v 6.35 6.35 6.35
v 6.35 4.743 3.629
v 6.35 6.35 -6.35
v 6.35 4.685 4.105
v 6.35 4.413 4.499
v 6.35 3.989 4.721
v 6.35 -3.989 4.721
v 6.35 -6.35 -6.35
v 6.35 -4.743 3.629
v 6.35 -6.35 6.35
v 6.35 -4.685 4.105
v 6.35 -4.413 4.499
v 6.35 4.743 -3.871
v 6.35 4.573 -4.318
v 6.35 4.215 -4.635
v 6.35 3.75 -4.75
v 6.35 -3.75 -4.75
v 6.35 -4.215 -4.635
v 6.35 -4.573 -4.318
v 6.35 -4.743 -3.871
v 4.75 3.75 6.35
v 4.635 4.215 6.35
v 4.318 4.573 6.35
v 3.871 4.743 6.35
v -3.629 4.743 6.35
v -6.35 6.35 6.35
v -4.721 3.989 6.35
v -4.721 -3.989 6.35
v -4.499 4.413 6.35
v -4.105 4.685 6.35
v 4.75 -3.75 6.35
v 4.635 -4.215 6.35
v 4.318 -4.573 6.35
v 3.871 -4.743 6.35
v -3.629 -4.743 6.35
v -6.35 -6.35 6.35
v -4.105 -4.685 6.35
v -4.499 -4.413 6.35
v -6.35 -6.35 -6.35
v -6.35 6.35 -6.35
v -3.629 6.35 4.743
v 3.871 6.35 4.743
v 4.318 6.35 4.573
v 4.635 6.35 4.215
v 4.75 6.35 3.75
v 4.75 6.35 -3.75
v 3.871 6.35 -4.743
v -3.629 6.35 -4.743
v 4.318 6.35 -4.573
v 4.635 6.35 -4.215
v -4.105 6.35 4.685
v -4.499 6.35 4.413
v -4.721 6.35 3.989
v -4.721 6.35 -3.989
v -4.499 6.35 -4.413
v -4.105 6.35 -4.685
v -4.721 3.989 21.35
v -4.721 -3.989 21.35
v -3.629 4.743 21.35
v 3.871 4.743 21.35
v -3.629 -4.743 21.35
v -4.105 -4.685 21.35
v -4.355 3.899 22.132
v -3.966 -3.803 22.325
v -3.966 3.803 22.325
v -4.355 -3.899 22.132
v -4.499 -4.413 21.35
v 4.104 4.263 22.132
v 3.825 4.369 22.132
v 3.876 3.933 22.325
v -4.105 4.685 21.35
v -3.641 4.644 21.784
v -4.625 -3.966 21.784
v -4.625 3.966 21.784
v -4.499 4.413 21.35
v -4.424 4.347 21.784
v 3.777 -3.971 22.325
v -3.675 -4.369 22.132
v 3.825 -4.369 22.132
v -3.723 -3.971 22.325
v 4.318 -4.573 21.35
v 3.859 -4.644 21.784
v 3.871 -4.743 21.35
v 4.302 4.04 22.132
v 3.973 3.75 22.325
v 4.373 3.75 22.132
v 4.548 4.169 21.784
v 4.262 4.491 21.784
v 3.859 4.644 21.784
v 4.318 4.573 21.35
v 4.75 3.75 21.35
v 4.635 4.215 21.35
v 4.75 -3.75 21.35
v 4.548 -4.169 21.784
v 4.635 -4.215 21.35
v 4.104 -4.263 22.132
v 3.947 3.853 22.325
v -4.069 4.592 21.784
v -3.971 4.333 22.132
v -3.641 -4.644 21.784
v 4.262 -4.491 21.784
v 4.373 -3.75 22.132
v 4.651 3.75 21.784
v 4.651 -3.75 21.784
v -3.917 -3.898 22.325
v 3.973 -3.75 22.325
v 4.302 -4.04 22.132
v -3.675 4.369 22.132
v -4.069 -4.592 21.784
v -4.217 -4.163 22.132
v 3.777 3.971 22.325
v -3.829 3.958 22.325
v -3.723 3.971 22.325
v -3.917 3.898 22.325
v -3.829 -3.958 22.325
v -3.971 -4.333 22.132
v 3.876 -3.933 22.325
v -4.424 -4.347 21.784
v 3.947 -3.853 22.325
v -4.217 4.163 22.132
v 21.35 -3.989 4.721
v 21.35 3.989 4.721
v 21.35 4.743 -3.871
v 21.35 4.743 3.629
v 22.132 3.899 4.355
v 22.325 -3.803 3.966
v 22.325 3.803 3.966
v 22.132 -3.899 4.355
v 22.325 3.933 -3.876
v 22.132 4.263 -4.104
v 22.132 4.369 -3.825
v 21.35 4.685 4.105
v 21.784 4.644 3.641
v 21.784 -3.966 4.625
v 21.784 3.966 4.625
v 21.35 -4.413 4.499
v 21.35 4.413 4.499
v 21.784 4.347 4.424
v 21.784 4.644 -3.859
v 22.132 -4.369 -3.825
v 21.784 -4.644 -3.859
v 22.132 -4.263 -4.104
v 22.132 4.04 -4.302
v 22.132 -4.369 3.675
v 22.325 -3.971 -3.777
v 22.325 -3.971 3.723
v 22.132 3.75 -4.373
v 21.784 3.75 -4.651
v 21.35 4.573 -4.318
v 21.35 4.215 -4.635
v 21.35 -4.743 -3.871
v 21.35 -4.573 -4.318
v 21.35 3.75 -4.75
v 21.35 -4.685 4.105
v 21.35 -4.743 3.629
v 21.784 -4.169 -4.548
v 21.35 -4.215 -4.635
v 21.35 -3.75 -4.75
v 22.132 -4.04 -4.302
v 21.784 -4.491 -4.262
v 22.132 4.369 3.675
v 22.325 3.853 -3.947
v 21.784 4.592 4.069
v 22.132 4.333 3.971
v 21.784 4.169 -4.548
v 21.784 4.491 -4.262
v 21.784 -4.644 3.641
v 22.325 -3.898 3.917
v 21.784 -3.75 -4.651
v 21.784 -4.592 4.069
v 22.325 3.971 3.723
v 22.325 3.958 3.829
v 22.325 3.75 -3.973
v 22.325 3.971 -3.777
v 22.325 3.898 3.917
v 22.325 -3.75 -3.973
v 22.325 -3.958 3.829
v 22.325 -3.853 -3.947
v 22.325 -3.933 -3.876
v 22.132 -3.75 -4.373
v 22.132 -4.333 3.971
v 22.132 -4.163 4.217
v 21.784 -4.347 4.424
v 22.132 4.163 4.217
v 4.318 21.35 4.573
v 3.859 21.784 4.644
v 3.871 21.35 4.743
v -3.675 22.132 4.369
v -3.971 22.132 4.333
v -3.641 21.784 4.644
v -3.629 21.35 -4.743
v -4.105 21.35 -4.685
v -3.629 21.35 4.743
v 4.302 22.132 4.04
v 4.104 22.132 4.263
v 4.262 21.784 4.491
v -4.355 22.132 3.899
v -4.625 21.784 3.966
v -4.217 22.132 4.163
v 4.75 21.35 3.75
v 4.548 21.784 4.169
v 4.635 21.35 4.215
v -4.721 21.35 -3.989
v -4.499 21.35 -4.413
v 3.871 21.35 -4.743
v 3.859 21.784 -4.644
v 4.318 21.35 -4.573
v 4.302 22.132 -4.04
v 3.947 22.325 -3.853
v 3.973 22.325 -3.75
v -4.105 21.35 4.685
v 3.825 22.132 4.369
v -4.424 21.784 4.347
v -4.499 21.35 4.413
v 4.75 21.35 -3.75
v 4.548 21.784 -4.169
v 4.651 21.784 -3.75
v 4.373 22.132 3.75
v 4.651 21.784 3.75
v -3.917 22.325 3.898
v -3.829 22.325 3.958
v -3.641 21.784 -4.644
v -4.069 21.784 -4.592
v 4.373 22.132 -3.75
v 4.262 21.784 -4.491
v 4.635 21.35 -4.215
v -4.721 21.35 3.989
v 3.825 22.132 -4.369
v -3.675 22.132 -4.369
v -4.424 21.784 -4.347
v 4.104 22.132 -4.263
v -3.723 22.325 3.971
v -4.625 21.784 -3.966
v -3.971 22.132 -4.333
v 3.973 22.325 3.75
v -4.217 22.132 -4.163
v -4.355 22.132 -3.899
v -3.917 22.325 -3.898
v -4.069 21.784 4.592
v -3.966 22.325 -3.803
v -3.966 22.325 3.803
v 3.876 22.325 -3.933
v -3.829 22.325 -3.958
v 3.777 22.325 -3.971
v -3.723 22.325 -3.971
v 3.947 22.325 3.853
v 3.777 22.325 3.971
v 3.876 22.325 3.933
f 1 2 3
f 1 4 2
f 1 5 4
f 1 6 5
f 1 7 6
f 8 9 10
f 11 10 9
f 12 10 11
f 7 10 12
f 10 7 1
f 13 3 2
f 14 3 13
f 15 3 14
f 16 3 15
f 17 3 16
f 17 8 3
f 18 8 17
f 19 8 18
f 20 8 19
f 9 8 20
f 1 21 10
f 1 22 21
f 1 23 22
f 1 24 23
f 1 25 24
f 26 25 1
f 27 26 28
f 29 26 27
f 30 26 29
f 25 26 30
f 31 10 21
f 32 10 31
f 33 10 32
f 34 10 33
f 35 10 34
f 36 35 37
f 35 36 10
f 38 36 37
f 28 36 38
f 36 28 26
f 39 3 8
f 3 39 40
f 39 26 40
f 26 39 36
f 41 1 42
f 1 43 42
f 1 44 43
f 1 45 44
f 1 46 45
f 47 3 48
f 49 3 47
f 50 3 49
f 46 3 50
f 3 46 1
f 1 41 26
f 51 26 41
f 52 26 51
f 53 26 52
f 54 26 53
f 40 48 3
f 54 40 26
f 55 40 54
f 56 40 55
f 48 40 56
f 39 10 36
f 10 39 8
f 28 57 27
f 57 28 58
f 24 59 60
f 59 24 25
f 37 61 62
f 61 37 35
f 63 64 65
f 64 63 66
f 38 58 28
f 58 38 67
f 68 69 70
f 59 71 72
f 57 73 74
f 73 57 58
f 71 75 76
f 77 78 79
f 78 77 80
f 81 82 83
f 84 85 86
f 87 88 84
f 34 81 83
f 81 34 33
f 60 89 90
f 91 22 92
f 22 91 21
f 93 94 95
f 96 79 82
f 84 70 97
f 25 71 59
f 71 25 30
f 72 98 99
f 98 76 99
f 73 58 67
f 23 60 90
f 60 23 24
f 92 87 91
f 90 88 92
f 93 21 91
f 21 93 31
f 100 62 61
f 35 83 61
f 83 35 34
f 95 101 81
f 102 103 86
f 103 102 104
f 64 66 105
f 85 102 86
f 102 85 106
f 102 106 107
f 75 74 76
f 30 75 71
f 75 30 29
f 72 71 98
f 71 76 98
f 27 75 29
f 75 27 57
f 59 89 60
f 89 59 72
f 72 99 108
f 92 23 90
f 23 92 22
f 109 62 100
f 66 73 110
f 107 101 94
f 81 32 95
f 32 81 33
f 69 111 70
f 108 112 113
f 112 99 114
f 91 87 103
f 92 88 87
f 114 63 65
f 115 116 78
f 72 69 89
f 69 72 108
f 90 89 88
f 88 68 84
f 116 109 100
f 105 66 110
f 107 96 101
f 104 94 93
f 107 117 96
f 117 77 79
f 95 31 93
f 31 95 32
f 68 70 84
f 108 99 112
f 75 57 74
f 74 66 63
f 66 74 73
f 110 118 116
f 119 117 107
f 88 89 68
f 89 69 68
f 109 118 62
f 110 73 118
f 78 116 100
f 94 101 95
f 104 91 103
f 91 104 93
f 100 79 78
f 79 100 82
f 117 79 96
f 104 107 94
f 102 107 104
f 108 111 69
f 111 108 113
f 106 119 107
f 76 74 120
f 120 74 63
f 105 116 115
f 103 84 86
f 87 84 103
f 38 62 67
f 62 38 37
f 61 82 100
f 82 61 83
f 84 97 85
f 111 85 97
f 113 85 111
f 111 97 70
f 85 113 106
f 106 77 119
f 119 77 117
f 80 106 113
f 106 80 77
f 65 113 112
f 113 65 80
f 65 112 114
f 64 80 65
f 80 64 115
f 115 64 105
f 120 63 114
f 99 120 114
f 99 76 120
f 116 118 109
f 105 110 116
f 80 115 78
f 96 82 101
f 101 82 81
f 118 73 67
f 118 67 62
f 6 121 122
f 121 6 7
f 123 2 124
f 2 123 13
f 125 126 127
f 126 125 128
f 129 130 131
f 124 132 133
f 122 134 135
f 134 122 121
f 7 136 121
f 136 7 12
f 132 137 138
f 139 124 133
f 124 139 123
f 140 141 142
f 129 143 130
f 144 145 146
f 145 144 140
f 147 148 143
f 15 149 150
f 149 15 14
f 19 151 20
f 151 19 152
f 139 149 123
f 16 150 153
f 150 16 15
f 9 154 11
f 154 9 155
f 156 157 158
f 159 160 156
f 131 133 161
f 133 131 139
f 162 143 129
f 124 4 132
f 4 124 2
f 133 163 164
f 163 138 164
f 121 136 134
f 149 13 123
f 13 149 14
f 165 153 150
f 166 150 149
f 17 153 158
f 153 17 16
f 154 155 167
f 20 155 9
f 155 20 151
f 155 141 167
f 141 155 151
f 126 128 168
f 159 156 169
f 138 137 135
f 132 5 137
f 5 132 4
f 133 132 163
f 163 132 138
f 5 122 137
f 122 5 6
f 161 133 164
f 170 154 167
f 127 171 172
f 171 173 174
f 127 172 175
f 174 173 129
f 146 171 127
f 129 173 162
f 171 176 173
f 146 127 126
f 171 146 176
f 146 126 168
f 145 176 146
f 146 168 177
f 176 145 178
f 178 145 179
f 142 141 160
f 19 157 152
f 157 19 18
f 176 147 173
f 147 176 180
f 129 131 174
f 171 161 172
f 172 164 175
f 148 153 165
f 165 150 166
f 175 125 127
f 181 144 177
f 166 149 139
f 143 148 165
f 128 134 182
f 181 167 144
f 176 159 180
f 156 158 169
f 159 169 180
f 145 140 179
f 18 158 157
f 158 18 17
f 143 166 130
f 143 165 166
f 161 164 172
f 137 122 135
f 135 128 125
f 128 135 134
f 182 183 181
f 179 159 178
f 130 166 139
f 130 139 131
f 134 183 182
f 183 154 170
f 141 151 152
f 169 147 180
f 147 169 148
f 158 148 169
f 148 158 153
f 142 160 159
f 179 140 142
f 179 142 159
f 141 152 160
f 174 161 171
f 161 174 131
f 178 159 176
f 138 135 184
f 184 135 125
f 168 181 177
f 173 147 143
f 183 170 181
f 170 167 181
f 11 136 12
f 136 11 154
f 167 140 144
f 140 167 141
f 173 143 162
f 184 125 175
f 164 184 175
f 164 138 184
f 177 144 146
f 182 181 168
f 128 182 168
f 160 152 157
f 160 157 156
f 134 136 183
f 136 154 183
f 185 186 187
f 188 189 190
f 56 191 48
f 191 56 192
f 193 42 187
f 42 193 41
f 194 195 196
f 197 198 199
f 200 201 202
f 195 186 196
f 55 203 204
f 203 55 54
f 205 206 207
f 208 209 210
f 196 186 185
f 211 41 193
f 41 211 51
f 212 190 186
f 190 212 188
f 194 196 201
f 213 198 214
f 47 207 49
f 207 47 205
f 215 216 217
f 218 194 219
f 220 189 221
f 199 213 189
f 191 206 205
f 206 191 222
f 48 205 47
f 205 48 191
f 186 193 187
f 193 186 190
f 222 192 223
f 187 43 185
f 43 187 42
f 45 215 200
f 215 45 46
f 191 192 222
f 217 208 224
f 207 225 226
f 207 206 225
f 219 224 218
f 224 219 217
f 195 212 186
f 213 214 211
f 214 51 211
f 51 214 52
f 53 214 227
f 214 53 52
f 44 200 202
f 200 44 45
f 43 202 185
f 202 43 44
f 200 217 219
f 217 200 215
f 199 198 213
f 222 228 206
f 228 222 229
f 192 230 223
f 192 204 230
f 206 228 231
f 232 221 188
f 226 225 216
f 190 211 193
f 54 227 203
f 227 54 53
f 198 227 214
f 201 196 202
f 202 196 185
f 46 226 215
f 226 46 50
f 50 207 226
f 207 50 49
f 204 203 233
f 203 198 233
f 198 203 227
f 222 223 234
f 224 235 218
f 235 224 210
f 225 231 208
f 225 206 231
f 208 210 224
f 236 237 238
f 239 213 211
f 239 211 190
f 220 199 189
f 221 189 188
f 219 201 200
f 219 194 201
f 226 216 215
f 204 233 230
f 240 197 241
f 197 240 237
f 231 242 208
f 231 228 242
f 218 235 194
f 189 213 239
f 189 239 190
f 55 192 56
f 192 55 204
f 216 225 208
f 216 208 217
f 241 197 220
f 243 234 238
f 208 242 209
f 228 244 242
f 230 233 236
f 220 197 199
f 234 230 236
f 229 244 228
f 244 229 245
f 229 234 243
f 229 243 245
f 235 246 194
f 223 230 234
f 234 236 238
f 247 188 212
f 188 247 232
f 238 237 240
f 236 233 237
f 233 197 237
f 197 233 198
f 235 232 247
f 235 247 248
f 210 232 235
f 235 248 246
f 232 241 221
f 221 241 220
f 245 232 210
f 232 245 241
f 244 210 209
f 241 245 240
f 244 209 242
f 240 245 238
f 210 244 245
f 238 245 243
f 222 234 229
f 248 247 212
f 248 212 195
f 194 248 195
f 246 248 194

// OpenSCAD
// Square tubing corner connector
// David O'Connor  david@lizardstation.com
// 14 August 2018

// Inside dimension
insideDim = 9.5; // [6:0.1:30]
// Outside dimension
outsideDim = 12.7;// [6:0.1:30]
// Protrusion length
protrusionLength = 15;// [6:0.2:60]
// Roundoff radius
roundoffRadius = 1;// [1.0:0.1:4.0]

bracket(id=insideDim, od=outsideDim, l=protrusionLength, r=roundoffRadius, fa=5, $fs=0.5);

module bracket(id=6, od=8, l=8, r=1) {
    union() { 
        cube([od, od, od], center=true);
        m = l/2+od/2;
        translate([0, 0, m])
            protrusion(id, l, r);

        translate([m, 0, 0])
            rotate([0, 90, 0])
                protrusion(id, l, r);

        translate([0, m, 0])
            rotate([90, 0, 0])
                protrusion(id, l, r);
    }
}

module protrusion(t, l, r) {
    minkowski() {
    cube([t-2*r, t-2*r, l], center=true);  
        sphere(r=r);
    }
}  
